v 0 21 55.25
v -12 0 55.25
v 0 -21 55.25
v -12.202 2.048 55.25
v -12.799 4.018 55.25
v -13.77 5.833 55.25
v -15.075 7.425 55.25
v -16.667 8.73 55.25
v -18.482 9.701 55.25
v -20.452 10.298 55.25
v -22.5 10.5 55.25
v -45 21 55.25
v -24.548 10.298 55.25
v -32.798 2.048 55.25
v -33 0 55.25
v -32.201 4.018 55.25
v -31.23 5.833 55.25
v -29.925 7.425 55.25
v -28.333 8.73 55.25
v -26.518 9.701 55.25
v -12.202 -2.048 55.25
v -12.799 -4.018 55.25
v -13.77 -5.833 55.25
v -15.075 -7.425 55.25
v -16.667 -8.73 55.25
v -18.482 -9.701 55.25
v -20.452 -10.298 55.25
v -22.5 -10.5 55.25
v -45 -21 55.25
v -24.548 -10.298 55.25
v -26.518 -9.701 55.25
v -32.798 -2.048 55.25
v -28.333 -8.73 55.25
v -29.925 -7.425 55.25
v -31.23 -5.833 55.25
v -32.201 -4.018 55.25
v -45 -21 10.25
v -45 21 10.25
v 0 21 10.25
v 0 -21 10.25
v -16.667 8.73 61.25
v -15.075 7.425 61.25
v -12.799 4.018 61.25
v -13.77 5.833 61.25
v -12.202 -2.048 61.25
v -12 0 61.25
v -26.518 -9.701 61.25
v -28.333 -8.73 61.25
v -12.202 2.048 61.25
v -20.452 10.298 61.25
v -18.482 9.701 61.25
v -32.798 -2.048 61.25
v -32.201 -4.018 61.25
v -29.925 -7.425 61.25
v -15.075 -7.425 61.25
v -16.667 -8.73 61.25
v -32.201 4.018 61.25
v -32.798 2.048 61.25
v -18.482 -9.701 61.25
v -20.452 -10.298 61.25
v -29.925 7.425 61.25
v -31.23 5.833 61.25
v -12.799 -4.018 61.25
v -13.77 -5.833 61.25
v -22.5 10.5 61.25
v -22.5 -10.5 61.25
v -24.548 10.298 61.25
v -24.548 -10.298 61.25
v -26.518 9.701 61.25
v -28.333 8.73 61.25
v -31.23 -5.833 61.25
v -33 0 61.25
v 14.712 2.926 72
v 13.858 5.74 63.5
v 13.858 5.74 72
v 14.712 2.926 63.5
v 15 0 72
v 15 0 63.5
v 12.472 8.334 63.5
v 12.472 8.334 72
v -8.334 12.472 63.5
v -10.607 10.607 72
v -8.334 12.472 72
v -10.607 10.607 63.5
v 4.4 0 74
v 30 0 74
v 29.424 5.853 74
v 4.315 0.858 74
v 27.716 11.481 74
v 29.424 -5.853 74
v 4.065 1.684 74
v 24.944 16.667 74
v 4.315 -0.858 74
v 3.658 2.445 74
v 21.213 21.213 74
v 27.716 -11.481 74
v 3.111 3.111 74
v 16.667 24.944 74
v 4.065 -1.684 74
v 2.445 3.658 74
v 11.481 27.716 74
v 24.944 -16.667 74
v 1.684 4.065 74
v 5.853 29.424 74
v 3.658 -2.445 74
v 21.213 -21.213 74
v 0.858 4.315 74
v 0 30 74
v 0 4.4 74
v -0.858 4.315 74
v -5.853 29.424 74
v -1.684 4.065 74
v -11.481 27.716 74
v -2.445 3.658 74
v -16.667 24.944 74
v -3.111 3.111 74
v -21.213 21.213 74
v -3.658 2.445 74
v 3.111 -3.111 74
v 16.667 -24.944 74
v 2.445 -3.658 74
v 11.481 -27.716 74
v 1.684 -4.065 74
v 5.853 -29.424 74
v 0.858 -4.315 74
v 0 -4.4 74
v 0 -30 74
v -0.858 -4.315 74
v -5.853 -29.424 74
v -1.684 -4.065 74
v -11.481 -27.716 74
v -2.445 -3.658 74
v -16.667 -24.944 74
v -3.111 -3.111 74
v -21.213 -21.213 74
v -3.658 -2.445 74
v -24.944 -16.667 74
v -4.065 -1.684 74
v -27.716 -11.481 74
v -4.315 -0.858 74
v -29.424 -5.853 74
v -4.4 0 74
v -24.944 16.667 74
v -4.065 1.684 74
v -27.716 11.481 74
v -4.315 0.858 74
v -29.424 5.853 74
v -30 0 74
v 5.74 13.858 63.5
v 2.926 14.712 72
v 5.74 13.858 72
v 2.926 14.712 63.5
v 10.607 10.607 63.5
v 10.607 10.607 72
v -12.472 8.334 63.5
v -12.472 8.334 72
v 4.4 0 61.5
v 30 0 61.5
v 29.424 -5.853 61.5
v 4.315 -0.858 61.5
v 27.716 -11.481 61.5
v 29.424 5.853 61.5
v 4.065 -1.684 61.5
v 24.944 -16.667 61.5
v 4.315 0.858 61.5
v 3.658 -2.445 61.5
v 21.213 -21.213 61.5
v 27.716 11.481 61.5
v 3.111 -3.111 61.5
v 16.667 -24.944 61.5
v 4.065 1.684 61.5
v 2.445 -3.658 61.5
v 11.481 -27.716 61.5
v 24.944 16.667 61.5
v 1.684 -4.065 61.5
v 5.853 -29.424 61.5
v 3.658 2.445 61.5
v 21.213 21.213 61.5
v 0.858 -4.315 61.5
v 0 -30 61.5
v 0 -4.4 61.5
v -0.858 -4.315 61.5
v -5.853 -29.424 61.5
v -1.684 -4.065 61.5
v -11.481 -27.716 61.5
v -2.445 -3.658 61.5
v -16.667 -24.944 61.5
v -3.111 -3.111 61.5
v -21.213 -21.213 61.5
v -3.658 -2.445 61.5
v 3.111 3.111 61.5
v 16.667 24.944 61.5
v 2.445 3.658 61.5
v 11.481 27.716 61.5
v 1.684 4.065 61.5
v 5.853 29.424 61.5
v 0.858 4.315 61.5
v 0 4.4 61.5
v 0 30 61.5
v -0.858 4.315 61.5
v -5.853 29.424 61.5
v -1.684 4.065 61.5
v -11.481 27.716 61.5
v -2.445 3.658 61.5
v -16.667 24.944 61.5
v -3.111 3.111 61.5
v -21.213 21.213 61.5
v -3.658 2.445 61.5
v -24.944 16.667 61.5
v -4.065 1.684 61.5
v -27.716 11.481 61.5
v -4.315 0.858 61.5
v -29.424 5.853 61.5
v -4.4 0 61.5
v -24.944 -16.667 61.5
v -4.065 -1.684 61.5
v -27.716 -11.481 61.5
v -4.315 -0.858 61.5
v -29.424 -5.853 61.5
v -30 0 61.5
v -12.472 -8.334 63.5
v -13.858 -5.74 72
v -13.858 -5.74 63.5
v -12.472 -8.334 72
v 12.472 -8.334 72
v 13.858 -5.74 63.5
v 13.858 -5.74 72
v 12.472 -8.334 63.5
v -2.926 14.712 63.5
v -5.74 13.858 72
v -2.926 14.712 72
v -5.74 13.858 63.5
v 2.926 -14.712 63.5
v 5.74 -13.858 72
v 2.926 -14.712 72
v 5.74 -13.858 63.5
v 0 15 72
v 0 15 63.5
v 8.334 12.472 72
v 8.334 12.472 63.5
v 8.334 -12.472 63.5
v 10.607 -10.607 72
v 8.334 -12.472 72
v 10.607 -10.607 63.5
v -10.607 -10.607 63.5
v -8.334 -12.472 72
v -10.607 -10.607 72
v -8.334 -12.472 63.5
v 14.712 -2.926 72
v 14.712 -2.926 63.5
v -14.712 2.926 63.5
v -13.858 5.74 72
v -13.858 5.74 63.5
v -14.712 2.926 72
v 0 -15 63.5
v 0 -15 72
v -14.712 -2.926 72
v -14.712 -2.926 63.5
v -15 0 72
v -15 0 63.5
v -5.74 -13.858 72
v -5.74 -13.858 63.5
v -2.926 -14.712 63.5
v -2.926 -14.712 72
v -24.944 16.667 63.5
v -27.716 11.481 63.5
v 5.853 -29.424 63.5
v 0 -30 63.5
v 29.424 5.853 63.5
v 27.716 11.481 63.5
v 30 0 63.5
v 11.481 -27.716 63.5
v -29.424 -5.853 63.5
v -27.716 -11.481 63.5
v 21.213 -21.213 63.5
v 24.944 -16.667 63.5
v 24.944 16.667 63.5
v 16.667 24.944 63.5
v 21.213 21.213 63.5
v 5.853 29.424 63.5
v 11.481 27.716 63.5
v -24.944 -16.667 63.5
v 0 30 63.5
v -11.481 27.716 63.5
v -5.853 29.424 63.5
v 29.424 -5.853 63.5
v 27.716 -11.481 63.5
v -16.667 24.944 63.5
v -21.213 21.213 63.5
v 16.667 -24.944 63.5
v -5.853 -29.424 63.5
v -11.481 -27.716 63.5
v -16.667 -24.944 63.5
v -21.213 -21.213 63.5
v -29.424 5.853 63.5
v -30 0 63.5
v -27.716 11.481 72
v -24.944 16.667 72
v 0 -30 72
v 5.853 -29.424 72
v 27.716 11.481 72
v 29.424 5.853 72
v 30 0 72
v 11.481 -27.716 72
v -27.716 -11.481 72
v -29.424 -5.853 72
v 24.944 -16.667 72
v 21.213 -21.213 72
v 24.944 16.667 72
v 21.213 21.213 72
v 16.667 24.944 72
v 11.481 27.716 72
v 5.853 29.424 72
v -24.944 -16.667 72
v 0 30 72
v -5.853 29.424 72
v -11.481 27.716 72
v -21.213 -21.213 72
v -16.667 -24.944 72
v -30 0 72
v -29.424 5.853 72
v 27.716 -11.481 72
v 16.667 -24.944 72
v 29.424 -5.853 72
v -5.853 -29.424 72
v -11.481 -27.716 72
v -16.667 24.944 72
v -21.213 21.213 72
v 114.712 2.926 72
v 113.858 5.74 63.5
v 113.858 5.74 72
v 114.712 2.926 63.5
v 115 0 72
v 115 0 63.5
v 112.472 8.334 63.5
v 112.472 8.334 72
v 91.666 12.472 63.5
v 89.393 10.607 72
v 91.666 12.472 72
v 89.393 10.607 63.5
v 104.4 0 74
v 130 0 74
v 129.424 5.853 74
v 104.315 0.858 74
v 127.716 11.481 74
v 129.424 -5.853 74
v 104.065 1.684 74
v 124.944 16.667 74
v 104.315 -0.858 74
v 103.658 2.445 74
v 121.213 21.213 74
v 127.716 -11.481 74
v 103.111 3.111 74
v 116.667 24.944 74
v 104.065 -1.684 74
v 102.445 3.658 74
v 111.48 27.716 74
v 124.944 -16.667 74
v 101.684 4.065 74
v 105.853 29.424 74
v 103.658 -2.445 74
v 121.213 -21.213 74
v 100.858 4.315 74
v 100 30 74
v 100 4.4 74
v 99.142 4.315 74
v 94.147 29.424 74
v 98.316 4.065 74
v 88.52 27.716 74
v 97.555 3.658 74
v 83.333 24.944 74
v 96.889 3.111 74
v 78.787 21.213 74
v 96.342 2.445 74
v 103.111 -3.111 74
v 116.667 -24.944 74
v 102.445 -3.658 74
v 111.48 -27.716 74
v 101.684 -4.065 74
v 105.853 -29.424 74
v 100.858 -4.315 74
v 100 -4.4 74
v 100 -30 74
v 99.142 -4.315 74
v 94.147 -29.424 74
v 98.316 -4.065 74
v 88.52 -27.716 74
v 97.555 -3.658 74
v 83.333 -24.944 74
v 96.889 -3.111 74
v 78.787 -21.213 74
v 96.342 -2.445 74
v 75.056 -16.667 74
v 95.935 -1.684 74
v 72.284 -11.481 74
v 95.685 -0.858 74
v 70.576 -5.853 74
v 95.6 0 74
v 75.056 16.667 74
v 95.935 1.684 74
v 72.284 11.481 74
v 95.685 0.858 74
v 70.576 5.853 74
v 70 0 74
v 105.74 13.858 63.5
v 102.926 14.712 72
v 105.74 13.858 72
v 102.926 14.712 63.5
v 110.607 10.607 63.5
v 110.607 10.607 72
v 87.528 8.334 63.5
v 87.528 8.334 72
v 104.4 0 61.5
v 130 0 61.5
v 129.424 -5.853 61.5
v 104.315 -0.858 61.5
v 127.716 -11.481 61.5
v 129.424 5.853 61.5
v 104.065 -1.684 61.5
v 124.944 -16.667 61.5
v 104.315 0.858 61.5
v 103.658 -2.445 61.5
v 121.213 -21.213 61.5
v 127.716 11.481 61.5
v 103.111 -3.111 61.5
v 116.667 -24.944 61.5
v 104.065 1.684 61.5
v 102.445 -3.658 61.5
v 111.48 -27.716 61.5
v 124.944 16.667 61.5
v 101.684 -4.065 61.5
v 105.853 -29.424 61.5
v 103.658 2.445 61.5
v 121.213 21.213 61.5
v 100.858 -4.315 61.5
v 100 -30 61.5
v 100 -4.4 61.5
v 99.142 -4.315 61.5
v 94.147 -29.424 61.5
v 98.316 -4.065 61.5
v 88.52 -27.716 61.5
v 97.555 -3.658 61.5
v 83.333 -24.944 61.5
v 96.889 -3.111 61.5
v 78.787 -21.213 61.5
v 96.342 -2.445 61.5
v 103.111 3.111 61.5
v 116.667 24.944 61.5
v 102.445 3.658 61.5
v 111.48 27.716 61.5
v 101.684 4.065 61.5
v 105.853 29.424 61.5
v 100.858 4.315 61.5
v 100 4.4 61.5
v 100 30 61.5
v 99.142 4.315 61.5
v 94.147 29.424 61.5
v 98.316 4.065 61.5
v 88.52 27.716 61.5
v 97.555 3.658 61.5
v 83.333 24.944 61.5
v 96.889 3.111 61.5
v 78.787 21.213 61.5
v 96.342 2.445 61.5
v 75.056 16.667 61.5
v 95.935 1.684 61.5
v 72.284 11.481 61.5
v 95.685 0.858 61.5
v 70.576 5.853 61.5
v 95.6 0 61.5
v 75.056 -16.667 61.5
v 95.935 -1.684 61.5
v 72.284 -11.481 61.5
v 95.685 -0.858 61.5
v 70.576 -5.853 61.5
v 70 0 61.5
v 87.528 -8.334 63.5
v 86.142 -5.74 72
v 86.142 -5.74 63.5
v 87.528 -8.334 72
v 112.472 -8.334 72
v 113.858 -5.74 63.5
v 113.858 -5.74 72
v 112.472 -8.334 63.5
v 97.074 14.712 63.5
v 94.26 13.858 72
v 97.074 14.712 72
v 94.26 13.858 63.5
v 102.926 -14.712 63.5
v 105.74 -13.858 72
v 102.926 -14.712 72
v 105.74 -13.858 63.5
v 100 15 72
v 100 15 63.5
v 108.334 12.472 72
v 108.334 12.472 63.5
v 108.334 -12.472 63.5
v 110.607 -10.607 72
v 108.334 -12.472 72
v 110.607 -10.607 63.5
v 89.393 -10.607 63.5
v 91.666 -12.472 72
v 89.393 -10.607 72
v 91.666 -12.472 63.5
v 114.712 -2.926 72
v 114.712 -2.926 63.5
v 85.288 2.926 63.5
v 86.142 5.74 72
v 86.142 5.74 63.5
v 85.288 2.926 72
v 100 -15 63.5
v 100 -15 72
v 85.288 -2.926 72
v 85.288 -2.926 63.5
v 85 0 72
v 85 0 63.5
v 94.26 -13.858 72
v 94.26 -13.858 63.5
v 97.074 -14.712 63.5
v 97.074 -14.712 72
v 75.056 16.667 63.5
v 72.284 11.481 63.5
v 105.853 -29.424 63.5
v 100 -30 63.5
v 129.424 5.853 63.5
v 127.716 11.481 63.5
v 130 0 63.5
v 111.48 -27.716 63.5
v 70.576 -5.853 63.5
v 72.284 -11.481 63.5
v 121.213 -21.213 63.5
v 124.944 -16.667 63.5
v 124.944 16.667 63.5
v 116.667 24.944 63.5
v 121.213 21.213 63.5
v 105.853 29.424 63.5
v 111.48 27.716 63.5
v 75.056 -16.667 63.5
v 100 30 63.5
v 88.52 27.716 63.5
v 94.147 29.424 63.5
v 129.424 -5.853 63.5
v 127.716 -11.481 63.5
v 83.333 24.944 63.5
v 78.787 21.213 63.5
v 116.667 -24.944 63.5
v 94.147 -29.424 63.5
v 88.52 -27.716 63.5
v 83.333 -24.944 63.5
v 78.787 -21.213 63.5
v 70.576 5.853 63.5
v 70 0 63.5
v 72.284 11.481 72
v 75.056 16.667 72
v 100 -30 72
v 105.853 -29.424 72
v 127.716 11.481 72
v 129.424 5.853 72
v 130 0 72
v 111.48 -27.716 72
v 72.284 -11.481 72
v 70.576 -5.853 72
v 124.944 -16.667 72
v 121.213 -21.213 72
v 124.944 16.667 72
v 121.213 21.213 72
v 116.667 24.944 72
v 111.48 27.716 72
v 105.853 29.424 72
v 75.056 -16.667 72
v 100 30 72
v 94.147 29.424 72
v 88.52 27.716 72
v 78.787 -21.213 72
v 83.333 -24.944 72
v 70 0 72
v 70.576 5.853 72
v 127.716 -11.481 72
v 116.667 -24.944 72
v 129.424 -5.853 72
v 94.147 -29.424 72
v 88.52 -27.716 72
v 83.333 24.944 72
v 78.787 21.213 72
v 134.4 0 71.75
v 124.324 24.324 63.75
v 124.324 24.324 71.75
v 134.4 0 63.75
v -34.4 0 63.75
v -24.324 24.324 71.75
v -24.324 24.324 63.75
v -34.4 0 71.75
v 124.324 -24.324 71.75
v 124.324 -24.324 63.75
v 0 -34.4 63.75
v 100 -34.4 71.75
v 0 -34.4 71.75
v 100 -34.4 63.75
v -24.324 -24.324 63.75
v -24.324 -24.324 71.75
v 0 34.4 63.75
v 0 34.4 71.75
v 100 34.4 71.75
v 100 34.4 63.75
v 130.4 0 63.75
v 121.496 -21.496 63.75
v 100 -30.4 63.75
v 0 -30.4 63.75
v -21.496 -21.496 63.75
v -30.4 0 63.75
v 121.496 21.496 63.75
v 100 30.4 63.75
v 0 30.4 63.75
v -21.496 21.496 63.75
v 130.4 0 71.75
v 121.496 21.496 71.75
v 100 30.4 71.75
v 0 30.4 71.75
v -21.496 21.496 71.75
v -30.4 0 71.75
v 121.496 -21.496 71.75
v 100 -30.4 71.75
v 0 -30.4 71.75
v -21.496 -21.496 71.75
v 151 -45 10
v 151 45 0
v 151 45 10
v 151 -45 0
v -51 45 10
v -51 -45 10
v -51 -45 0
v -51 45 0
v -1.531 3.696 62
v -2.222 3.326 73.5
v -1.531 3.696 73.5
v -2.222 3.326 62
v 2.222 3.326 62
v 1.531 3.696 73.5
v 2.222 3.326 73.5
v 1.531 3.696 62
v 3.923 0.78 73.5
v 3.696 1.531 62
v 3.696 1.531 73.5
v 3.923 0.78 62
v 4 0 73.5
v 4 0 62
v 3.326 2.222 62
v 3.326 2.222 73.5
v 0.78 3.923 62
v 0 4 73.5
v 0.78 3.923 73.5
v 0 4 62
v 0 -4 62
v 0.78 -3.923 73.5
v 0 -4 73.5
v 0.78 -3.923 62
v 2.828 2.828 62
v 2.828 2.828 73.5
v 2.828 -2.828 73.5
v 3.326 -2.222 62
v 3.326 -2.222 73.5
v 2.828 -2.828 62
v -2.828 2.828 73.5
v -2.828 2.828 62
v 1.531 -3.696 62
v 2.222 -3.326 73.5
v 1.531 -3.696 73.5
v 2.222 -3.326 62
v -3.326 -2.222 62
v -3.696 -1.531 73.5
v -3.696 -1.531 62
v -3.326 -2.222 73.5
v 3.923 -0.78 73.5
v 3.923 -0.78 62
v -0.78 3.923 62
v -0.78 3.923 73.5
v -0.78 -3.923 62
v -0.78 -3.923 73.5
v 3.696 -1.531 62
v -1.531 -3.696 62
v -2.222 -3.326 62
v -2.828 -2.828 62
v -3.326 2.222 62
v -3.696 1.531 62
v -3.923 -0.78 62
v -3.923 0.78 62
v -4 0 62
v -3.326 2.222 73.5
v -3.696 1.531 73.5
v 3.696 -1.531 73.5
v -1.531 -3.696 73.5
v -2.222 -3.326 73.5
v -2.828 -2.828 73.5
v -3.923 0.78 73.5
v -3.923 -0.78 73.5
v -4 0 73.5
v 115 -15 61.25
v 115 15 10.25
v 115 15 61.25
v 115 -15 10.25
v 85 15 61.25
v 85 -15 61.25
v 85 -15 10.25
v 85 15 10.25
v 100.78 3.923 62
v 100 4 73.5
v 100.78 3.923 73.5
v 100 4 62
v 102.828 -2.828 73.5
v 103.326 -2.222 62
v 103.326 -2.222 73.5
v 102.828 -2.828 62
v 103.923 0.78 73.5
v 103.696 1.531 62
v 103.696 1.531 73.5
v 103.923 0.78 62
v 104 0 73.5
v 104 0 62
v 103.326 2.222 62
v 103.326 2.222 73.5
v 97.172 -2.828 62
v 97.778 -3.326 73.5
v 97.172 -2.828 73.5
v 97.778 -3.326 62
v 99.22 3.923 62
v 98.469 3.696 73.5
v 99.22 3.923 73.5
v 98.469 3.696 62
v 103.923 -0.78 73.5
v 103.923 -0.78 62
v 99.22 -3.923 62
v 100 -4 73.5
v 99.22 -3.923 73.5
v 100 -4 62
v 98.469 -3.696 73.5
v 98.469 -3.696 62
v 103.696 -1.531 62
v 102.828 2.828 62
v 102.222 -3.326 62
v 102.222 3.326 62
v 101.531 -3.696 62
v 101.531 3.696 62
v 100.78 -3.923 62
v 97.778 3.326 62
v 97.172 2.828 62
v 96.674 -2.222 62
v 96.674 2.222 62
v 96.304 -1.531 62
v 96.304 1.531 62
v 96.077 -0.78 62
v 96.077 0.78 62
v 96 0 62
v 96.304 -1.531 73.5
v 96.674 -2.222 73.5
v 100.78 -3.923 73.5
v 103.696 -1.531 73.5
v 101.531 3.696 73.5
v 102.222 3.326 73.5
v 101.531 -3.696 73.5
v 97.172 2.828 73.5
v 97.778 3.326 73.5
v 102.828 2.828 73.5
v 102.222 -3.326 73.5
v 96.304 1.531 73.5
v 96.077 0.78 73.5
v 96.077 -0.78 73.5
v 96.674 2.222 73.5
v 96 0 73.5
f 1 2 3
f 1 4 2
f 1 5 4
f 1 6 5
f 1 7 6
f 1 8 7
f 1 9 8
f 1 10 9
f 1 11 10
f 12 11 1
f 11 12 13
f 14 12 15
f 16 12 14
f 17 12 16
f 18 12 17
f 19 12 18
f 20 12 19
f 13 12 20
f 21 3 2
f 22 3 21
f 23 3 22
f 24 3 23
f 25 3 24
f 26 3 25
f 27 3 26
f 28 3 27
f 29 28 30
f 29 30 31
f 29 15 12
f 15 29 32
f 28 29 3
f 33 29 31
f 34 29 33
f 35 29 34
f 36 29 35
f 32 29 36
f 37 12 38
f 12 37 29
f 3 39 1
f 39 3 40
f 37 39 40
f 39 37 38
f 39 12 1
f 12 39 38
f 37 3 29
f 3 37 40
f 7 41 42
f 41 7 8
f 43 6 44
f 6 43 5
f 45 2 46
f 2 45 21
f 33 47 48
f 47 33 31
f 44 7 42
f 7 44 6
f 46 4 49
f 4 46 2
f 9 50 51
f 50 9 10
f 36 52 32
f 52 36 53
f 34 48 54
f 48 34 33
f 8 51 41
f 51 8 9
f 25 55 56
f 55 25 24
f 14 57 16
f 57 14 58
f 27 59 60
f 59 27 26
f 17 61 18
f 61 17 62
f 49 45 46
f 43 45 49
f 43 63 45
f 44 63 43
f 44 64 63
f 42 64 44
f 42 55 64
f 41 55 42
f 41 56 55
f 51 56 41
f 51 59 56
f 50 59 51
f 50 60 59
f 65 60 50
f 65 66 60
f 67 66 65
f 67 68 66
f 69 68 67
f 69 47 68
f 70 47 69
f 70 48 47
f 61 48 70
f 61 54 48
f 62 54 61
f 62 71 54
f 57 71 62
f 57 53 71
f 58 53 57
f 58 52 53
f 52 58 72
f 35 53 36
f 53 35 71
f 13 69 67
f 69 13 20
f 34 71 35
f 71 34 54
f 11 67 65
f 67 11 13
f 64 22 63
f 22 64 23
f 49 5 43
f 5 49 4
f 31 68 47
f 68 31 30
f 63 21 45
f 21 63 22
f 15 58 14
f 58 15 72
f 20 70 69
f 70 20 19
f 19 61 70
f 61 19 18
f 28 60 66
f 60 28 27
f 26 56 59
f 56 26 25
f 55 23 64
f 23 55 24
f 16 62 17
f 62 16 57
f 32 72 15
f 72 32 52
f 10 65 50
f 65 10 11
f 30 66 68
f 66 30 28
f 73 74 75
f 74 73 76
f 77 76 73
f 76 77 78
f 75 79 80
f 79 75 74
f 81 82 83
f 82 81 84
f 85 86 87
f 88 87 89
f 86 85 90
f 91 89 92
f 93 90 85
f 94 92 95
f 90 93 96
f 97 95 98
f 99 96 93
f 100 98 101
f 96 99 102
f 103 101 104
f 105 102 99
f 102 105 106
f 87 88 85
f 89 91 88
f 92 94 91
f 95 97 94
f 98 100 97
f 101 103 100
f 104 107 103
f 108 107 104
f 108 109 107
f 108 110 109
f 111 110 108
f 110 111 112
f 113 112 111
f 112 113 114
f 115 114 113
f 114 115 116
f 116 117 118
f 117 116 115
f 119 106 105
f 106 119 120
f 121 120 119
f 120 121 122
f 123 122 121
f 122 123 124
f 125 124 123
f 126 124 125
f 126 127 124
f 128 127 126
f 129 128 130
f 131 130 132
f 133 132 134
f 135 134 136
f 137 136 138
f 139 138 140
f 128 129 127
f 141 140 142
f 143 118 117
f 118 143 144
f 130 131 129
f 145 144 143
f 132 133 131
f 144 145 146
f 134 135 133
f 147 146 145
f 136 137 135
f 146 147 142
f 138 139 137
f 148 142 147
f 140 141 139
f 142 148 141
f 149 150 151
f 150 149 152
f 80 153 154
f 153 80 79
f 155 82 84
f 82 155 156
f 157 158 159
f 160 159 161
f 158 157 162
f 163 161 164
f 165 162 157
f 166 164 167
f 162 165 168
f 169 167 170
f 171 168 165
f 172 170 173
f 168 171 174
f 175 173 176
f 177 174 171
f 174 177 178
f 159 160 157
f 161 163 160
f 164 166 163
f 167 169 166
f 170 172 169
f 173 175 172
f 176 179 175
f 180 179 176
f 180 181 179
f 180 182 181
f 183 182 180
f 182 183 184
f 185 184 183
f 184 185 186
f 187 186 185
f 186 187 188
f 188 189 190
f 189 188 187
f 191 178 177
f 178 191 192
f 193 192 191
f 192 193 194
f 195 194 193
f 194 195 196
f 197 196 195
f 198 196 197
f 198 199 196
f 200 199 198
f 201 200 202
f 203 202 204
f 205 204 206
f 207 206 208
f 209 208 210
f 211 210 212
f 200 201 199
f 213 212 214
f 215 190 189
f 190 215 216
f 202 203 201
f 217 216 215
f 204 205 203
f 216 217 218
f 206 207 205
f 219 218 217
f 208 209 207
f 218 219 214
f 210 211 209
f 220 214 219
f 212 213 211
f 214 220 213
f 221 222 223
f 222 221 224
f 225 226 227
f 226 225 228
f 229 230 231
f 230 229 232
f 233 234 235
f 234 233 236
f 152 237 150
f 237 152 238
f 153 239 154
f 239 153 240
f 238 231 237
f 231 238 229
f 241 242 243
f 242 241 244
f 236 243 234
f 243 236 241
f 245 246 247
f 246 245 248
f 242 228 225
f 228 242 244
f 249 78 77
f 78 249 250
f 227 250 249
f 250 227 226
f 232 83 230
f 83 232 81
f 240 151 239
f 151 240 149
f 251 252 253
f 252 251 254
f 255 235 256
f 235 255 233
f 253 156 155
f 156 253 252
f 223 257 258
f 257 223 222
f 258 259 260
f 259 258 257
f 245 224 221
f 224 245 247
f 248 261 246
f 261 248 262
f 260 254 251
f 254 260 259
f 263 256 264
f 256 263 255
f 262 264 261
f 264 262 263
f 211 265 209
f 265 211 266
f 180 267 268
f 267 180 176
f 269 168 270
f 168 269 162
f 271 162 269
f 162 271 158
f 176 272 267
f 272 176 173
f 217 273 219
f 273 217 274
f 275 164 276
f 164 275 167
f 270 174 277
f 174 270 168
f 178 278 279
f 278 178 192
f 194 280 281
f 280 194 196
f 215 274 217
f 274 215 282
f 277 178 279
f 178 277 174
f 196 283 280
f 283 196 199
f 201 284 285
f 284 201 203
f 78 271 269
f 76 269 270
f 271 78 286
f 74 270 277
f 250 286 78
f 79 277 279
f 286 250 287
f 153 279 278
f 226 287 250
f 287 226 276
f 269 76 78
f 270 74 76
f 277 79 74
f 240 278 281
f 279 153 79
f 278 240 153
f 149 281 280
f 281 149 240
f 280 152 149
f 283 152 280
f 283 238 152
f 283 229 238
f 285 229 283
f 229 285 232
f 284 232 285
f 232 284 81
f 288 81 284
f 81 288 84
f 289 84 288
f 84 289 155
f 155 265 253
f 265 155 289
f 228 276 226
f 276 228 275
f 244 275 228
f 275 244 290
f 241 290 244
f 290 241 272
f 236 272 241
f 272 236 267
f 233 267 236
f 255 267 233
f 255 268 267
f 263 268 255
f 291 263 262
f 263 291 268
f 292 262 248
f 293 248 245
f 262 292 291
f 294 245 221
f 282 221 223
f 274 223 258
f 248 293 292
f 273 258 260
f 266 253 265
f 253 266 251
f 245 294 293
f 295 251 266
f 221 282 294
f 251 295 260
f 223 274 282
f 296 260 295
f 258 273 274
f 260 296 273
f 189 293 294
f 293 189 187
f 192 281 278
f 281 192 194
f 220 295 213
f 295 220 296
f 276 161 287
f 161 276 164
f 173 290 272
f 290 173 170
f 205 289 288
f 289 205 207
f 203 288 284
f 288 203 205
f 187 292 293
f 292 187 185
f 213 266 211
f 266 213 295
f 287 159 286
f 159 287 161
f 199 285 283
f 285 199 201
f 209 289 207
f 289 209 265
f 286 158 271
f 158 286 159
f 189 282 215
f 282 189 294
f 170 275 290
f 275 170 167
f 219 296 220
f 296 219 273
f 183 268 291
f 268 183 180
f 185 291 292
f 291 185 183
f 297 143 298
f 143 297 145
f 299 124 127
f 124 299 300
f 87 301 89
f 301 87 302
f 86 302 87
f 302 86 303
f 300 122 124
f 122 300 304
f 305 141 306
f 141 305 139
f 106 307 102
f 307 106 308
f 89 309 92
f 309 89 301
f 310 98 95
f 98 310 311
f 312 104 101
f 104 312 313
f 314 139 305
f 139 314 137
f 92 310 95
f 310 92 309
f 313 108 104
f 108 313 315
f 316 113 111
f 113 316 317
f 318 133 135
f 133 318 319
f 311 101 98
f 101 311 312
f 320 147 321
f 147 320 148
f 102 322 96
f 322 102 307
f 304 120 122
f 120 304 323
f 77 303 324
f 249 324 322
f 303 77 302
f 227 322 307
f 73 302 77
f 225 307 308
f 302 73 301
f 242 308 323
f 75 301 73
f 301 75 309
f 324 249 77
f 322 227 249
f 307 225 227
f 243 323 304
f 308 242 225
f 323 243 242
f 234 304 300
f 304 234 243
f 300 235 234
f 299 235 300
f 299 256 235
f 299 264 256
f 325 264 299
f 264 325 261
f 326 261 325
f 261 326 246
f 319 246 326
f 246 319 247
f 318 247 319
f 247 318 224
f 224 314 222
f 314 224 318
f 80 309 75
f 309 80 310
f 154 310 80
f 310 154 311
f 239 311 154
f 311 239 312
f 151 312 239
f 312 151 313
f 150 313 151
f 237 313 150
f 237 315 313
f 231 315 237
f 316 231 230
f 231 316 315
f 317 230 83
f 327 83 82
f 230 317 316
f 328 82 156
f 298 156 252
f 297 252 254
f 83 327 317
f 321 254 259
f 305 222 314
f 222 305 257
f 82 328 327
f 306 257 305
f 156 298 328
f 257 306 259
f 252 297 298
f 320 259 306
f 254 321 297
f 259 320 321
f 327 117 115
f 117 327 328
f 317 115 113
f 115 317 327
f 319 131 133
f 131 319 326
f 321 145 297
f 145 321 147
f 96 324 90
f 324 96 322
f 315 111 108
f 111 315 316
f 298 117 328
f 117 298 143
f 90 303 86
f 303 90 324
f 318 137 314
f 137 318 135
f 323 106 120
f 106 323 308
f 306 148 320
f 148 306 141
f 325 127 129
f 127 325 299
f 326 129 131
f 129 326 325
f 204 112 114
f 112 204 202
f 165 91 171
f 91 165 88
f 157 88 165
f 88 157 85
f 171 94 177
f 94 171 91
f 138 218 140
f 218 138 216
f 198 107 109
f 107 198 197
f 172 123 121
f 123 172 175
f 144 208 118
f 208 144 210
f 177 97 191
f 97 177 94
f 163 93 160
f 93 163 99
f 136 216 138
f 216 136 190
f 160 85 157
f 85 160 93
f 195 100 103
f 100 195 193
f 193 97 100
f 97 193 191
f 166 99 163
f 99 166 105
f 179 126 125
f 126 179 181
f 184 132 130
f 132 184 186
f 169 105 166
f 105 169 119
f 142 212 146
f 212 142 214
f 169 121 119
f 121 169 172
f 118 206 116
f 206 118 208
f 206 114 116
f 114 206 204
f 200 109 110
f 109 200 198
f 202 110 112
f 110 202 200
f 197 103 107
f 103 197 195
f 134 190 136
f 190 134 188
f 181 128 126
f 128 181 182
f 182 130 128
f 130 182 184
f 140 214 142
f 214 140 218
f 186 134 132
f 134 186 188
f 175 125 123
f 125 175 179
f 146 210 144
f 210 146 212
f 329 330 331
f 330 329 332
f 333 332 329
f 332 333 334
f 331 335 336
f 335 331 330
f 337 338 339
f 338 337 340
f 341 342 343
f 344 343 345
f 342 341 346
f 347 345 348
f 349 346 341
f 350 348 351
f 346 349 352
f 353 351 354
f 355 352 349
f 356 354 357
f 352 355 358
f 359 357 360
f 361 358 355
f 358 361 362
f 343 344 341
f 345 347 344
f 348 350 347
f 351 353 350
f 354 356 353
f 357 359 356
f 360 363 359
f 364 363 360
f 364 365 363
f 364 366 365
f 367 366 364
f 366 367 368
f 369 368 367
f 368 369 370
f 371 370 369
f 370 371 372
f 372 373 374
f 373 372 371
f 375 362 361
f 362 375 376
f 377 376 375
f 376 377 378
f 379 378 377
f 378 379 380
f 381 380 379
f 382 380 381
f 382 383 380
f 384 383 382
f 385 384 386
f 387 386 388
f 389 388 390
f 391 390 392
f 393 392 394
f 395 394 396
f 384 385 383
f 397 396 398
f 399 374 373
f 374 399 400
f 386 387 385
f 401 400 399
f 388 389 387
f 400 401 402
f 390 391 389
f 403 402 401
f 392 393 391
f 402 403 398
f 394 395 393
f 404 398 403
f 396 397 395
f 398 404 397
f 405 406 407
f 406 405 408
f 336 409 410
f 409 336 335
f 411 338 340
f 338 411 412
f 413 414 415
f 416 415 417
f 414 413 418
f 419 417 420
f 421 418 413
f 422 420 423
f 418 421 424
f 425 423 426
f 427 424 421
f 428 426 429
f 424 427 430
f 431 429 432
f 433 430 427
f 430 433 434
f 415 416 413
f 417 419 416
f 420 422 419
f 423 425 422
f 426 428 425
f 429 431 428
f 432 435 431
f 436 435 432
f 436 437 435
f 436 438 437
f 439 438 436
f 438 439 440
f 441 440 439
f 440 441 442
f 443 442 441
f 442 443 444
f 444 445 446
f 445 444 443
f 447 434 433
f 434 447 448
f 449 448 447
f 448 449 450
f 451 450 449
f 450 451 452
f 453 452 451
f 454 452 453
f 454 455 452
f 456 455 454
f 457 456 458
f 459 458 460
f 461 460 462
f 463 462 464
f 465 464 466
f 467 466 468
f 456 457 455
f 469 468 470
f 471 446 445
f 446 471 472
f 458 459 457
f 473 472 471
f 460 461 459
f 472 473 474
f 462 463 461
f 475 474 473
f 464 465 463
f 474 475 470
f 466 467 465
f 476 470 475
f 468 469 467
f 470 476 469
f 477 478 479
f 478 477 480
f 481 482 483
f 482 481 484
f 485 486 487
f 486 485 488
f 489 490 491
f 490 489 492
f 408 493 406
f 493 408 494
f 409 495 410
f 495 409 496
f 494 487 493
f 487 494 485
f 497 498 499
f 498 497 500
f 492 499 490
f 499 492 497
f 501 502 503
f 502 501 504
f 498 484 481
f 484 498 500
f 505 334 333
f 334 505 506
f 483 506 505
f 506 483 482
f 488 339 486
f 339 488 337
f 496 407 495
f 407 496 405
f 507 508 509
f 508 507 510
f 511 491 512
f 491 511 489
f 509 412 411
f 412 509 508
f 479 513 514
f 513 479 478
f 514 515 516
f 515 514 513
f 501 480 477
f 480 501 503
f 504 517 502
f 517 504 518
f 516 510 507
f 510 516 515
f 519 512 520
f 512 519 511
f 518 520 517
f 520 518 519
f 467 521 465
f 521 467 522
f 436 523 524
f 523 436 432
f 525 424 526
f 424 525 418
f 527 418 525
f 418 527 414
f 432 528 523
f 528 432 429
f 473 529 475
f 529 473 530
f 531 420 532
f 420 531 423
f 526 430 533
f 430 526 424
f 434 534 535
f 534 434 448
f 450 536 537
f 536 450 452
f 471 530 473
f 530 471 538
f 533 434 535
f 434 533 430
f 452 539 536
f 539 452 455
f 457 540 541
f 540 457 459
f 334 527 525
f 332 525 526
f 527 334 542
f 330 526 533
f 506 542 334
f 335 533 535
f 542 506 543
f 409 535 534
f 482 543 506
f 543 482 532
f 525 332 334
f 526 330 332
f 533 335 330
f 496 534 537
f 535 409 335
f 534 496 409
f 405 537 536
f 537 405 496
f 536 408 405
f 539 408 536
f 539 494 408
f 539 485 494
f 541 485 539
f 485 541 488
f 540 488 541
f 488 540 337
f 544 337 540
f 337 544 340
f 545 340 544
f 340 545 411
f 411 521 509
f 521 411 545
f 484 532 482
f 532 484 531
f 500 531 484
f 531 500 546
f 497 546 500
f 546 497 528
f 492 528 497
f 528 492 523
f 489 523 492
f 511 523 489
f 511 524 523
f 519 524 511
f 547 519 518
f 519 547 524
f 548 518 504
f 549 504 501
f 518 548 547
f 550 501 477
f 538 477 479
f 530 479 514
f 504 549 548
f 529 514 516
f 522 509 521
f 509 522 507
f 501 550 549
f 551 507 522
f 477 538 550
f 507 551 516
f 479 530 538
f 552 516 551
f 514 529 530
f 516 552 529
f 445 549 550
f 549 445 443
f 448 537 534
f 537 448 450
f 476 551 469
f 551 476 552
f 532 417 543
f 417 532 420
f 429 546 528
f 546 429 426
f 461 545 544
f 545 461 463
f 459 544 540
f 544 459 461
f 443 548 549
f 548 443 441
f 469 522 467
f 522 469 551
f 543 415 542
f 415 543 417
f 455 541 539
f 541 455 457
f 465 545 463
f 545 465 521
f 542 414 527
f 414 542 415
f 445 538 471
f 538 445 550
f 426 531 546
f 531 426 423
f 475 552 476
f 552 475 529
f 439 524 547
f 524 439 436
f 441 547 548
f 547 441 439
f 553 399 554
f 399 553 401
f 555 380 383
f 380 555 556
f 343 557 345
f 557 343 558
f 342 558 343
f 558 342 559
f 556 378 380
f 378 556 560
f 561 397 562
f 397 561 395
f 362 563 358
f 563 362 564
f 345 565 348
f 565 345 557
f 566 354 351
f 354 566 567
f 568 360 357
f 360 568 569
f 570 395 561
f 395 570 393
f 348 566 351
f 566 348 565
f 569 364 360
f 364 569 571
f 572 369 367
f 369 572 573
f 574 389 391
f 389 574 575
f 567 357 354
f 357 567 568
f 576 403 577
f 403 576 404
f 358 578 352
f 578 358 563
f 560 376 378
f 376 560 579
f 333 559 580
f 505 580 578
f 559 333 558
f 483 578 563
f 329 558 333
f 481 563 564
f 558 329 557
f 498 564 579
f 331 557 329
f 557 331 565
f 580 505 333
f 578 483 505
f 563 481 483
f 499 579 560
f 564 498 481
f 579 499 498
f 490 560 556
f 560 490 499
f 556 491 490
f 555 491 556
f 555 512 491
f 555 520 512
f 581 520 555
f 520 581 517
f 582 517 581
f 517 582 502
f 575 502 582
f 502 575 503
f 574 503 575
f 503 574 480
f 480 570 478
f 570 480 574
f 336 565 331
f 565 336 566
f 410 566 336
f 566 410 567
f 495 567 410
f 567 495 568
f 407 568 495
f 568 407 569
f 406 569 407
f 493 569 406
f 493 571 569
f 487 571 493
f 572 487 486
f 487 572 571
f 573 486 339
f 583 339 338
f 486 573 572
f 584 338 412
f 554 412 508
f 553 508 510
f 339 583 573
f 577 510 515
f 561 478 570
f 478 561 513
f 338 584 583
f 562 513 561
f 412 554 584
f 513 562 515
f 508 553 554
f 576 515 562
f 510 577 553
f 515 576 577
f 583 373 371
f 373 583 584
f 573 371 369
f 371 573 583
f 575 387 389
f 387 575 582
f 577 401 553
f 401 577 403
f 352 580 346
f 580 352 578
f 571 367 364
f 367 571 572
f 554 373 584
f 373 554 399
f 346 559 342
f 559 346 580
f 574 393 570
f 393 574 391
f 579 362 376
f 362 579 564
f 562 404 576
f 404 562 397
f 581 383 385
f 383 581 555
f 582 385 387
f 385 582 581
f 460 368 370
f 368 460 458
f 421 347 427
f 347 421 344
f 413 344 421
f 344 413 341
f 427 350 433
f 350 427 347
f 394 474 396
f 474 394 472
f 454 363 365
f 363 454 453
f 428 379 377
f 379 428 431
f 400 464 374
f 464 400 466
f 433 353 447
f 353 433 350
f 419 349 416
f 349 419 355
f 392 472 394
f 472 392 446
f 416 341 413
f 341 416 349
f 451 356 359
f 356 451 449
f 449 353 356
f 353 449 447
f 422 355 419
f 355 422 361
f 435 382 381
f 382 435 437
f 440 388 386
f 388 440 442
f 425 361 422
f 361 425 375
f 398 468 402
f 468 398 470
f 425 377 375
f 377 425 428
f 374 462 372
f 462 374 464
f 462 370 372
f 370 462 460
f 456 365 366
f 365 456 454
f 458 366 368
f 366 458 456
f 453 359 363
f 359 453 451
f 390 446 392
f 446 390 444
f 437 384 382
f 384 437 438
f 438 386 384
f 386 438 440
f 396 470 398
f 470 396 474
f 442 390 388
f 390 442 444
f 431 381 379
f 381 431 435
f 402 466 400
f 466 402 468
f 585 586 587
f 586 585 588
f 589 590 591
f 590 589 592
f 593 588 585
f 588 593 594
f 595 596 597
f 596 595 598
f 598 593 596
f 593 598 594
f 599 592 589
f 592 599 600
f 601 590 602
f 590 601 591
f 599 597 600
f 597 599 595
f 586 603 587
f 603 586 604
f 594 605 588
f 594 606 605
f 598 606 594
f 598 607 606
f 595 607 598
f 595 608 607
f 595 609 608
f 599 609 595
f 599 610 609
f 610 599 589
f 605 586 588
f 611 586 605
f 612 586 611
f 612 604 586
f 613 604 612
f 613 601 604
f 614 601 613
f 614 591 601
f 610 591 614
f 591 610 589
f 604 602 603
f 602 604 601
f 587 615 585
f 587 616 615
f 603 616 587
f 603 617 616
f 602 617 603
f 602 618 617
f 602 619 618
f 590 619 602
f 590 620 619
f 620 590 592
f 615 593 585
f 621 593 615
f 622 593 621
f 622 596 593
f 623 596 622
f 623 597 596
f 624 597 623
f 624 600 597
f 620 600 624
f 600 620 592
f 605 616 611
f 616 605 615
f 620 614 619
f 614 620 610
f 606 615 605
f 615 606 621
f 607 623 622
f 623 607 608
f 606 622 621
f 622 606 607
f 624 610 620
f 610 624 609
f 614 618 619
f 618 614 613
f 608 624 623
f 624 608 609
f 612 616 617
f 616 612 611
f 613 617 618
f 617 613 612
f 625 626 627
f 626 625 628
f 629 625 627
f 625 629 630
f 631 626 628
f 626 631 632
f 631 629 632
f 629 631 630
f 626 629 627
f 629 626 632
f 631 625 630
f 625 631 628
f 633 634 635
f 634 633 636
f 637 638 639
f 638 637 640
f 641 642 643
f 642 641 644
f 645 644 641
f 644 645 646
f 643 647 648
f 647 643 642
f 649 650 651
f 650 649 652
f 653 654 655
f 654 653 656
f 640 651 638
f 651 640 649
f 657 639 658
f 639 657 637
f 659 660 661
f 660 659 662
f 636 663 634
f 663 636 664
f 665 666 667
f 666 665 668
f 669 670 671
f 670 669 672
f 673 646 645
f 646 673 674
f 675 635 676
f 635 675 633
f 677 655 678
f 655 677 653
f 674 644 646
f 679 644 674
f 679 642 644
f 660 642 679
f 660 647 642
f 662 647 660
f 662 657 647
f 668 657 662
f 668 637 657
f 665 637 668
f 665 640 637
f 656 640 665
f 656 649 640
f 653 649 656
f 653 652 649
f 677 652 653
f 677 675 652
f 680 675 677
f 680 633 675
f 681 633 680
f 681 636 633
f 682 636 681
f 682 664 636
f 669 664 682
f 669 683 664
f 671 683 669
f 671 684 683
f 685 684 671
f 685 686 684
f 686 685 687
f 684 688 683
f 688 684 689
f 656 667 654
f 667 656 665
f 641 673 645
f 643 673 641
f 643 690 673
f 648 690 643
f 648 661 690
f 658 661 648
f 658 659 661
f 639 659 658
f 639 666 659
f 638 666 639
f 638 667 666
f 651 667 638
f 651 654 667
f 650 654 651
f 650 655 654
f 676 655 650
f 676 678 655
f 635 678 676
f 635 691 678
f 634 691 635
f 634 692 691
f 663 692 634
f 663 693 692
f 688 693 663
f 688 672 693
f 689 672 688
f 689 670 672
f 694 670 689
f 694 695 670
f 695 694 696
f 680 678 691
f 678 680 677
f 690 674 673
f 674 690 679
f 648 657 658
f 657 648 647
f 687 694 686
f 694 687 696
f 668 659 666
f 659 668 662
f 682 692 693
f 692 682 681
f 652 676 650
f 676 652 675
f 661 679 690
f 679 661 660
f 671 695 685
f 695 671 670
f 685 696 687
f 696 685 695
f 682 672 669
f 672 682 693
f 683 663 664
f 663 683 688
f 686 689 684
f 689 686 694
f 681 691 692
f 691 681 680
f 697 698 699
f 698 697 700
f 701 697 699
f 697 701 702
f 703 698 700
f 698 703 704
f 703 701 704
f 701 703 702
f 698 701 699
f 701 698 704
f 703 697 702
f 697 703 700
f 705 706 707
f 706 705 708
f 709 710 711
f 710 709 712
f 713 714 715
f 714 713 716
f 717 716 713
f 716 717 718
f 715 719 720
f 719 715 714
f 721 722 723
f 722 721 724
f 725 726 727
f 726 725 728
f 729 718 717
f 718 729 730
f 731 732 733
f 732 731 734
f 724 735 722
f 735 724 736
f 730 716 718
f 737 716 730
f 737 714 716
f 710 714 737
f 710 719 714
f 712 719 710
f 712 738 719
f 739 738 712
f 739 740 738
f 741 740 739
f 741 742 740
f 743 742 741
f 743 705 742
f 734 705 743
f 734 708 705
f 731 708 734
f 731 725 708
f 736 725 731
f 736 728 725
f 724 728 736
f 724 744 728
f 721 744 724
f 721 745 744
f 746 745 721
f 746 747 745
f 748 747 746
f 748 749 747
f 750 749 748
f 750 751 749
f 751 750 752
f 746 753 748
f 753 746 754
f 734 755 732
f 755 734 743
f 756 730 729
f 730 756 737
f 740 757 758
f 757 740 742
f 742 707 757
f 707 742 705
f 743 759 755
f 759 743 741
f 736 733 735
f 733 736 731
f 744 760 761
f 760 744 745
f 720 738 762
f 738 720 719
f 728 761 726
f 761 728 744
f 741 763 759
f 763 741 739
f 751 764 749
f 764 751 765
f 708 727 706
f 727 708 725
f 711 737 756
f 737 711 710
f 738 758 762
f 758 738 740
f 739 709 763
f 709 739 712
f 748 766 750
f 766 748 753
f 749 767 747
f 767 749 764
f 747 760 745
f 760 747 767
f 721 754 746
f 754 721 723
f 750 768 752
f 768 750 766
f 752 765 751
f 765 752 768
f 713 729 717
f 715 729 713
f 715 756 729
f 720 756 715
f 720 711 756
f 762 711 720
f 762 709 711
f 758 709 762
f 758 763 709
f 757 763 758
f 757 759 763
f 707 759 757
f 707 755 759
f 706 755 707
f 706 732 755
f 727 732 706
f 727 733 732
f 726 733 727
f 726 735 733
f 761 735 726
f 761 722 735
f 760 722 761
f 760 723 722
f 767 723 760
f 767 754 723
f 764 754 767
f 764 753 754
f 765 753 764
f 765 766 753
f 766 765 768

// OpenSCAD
$fn = 32;

// ------------------------------------------------------------------------
// Motor belt drive: span 100 mm, pulleys d60, belt 8 mm wide
// Every part is its own module, assembly() places every instance.
// ------------------------------------------------------------------------

// --- part 1 ---
module base_plate() {
  difference() {
    translate([-101, -45, 0]) cube([202, 90, 10]);
  }
}

// --- part 2 ---
module motor() {
  union() {
    translate([-22.5, -21, 0]) cube([45, 42, 45]);
    translate([25.5, 0, 22.5]) rotate([0, 90, 0]) cylinder(h = 6, d = 21, center = true);
  }
}

// --- part 3 ---
module drive_shaft() {
  translate([0, 0, -5.75]) cylinder(h = 11.5, d = 8);
}

// --- part 4 ---
module pulley_drive() {
  difference() {
    union() {
      cylinder(h = 12.5, d = 30);
      cylinder(h = 2, d = 60);
      translate([0, 0, 10.5]) cylinder(h = 2, d = 60);
    }
    translate([0, 0, -1]) cylinder(h = 14.5, d = 8.8);
  }
}

// --- part 5 ---
module idler_post() {
  translate([-15, -15, 0]) cube([30, 30, 51]);
}

// --- part 6 ---
module driven_shaft() {
  translate([0, 0, -5.75]) cylinder(h = 11.5, d = 8);
}

// --- part 7 ---
module pulley_driven() {
  difference() {
    union() {
      cylinder(h = 12.5, d = 30);
      cylinder(h = 2, d = 60);
      translate([0, 0, 10.5]) cylinder(h = 2, d = 60);
    }
    translate([0, 0, -1]) cylinder(h = 14.5, d = 8.8);
  }
}

// --- part 8 ---
module drive_belt() {
  difference() {
    linear_extrude(height = 8) polygon(points = concat([for (a = [90 : 45 : 270]) [34.4 * cos(a), 34.4 * sin(a)]], [for (a = [270 : 45 : 450]) [100 + 34.4 * cos(a), 34.4 * sin(a)]]));
    translate([0, 0, -1]) linear_extrude(height = 10) polygon(points = concat([for (a = [90 : 45 : 270]) [30.4 * cos(a), 30.4 * sin(a)]], [for (a = [270 : 45 : 450]) [100 + 30.4 * cos(a), 30.4 * sin(a)]]));
  }
}

// --- assembly ---
module assembly() {
  color([0.80, 0.24, 0.20]) translate([50, 0, 0]) rotate([0, 0, 0]) base_plate();
  color([0.20, 0.45, 0.75]) translate([0, 0, 32.75]) rotate([0, 270, 0]) motor();
  color([0.25, 0.62, 0.32]) translate([0, 0, 67.75]) rotate([0, 0, 0]) drive_shaft();
  color([0.92, 0.70, 0.18]) translate([0, 0, 61.5]) rotate([0, 0, 0]) pulley_drive();
  color([0.58, 0.35, 0.70]) translate([100, 0, 10.25]) rotate([0, 0, 0]) idler_post();
  color([0.16, 0.66, 0.66]) translate([100, 0, 67.75]) rotate([0, 0, 0]) driven_shaft();
  color([0.85, 0.48, 0.18]) translate([100, 0, 61.5]) rotate([0, 0, 0]) pulley_driven();
  color([0.55, 0.60, 0.65]) translate([0, 0, 63.75]) rotate([0, 0, 0]) drive_belt();
}

assembly();
